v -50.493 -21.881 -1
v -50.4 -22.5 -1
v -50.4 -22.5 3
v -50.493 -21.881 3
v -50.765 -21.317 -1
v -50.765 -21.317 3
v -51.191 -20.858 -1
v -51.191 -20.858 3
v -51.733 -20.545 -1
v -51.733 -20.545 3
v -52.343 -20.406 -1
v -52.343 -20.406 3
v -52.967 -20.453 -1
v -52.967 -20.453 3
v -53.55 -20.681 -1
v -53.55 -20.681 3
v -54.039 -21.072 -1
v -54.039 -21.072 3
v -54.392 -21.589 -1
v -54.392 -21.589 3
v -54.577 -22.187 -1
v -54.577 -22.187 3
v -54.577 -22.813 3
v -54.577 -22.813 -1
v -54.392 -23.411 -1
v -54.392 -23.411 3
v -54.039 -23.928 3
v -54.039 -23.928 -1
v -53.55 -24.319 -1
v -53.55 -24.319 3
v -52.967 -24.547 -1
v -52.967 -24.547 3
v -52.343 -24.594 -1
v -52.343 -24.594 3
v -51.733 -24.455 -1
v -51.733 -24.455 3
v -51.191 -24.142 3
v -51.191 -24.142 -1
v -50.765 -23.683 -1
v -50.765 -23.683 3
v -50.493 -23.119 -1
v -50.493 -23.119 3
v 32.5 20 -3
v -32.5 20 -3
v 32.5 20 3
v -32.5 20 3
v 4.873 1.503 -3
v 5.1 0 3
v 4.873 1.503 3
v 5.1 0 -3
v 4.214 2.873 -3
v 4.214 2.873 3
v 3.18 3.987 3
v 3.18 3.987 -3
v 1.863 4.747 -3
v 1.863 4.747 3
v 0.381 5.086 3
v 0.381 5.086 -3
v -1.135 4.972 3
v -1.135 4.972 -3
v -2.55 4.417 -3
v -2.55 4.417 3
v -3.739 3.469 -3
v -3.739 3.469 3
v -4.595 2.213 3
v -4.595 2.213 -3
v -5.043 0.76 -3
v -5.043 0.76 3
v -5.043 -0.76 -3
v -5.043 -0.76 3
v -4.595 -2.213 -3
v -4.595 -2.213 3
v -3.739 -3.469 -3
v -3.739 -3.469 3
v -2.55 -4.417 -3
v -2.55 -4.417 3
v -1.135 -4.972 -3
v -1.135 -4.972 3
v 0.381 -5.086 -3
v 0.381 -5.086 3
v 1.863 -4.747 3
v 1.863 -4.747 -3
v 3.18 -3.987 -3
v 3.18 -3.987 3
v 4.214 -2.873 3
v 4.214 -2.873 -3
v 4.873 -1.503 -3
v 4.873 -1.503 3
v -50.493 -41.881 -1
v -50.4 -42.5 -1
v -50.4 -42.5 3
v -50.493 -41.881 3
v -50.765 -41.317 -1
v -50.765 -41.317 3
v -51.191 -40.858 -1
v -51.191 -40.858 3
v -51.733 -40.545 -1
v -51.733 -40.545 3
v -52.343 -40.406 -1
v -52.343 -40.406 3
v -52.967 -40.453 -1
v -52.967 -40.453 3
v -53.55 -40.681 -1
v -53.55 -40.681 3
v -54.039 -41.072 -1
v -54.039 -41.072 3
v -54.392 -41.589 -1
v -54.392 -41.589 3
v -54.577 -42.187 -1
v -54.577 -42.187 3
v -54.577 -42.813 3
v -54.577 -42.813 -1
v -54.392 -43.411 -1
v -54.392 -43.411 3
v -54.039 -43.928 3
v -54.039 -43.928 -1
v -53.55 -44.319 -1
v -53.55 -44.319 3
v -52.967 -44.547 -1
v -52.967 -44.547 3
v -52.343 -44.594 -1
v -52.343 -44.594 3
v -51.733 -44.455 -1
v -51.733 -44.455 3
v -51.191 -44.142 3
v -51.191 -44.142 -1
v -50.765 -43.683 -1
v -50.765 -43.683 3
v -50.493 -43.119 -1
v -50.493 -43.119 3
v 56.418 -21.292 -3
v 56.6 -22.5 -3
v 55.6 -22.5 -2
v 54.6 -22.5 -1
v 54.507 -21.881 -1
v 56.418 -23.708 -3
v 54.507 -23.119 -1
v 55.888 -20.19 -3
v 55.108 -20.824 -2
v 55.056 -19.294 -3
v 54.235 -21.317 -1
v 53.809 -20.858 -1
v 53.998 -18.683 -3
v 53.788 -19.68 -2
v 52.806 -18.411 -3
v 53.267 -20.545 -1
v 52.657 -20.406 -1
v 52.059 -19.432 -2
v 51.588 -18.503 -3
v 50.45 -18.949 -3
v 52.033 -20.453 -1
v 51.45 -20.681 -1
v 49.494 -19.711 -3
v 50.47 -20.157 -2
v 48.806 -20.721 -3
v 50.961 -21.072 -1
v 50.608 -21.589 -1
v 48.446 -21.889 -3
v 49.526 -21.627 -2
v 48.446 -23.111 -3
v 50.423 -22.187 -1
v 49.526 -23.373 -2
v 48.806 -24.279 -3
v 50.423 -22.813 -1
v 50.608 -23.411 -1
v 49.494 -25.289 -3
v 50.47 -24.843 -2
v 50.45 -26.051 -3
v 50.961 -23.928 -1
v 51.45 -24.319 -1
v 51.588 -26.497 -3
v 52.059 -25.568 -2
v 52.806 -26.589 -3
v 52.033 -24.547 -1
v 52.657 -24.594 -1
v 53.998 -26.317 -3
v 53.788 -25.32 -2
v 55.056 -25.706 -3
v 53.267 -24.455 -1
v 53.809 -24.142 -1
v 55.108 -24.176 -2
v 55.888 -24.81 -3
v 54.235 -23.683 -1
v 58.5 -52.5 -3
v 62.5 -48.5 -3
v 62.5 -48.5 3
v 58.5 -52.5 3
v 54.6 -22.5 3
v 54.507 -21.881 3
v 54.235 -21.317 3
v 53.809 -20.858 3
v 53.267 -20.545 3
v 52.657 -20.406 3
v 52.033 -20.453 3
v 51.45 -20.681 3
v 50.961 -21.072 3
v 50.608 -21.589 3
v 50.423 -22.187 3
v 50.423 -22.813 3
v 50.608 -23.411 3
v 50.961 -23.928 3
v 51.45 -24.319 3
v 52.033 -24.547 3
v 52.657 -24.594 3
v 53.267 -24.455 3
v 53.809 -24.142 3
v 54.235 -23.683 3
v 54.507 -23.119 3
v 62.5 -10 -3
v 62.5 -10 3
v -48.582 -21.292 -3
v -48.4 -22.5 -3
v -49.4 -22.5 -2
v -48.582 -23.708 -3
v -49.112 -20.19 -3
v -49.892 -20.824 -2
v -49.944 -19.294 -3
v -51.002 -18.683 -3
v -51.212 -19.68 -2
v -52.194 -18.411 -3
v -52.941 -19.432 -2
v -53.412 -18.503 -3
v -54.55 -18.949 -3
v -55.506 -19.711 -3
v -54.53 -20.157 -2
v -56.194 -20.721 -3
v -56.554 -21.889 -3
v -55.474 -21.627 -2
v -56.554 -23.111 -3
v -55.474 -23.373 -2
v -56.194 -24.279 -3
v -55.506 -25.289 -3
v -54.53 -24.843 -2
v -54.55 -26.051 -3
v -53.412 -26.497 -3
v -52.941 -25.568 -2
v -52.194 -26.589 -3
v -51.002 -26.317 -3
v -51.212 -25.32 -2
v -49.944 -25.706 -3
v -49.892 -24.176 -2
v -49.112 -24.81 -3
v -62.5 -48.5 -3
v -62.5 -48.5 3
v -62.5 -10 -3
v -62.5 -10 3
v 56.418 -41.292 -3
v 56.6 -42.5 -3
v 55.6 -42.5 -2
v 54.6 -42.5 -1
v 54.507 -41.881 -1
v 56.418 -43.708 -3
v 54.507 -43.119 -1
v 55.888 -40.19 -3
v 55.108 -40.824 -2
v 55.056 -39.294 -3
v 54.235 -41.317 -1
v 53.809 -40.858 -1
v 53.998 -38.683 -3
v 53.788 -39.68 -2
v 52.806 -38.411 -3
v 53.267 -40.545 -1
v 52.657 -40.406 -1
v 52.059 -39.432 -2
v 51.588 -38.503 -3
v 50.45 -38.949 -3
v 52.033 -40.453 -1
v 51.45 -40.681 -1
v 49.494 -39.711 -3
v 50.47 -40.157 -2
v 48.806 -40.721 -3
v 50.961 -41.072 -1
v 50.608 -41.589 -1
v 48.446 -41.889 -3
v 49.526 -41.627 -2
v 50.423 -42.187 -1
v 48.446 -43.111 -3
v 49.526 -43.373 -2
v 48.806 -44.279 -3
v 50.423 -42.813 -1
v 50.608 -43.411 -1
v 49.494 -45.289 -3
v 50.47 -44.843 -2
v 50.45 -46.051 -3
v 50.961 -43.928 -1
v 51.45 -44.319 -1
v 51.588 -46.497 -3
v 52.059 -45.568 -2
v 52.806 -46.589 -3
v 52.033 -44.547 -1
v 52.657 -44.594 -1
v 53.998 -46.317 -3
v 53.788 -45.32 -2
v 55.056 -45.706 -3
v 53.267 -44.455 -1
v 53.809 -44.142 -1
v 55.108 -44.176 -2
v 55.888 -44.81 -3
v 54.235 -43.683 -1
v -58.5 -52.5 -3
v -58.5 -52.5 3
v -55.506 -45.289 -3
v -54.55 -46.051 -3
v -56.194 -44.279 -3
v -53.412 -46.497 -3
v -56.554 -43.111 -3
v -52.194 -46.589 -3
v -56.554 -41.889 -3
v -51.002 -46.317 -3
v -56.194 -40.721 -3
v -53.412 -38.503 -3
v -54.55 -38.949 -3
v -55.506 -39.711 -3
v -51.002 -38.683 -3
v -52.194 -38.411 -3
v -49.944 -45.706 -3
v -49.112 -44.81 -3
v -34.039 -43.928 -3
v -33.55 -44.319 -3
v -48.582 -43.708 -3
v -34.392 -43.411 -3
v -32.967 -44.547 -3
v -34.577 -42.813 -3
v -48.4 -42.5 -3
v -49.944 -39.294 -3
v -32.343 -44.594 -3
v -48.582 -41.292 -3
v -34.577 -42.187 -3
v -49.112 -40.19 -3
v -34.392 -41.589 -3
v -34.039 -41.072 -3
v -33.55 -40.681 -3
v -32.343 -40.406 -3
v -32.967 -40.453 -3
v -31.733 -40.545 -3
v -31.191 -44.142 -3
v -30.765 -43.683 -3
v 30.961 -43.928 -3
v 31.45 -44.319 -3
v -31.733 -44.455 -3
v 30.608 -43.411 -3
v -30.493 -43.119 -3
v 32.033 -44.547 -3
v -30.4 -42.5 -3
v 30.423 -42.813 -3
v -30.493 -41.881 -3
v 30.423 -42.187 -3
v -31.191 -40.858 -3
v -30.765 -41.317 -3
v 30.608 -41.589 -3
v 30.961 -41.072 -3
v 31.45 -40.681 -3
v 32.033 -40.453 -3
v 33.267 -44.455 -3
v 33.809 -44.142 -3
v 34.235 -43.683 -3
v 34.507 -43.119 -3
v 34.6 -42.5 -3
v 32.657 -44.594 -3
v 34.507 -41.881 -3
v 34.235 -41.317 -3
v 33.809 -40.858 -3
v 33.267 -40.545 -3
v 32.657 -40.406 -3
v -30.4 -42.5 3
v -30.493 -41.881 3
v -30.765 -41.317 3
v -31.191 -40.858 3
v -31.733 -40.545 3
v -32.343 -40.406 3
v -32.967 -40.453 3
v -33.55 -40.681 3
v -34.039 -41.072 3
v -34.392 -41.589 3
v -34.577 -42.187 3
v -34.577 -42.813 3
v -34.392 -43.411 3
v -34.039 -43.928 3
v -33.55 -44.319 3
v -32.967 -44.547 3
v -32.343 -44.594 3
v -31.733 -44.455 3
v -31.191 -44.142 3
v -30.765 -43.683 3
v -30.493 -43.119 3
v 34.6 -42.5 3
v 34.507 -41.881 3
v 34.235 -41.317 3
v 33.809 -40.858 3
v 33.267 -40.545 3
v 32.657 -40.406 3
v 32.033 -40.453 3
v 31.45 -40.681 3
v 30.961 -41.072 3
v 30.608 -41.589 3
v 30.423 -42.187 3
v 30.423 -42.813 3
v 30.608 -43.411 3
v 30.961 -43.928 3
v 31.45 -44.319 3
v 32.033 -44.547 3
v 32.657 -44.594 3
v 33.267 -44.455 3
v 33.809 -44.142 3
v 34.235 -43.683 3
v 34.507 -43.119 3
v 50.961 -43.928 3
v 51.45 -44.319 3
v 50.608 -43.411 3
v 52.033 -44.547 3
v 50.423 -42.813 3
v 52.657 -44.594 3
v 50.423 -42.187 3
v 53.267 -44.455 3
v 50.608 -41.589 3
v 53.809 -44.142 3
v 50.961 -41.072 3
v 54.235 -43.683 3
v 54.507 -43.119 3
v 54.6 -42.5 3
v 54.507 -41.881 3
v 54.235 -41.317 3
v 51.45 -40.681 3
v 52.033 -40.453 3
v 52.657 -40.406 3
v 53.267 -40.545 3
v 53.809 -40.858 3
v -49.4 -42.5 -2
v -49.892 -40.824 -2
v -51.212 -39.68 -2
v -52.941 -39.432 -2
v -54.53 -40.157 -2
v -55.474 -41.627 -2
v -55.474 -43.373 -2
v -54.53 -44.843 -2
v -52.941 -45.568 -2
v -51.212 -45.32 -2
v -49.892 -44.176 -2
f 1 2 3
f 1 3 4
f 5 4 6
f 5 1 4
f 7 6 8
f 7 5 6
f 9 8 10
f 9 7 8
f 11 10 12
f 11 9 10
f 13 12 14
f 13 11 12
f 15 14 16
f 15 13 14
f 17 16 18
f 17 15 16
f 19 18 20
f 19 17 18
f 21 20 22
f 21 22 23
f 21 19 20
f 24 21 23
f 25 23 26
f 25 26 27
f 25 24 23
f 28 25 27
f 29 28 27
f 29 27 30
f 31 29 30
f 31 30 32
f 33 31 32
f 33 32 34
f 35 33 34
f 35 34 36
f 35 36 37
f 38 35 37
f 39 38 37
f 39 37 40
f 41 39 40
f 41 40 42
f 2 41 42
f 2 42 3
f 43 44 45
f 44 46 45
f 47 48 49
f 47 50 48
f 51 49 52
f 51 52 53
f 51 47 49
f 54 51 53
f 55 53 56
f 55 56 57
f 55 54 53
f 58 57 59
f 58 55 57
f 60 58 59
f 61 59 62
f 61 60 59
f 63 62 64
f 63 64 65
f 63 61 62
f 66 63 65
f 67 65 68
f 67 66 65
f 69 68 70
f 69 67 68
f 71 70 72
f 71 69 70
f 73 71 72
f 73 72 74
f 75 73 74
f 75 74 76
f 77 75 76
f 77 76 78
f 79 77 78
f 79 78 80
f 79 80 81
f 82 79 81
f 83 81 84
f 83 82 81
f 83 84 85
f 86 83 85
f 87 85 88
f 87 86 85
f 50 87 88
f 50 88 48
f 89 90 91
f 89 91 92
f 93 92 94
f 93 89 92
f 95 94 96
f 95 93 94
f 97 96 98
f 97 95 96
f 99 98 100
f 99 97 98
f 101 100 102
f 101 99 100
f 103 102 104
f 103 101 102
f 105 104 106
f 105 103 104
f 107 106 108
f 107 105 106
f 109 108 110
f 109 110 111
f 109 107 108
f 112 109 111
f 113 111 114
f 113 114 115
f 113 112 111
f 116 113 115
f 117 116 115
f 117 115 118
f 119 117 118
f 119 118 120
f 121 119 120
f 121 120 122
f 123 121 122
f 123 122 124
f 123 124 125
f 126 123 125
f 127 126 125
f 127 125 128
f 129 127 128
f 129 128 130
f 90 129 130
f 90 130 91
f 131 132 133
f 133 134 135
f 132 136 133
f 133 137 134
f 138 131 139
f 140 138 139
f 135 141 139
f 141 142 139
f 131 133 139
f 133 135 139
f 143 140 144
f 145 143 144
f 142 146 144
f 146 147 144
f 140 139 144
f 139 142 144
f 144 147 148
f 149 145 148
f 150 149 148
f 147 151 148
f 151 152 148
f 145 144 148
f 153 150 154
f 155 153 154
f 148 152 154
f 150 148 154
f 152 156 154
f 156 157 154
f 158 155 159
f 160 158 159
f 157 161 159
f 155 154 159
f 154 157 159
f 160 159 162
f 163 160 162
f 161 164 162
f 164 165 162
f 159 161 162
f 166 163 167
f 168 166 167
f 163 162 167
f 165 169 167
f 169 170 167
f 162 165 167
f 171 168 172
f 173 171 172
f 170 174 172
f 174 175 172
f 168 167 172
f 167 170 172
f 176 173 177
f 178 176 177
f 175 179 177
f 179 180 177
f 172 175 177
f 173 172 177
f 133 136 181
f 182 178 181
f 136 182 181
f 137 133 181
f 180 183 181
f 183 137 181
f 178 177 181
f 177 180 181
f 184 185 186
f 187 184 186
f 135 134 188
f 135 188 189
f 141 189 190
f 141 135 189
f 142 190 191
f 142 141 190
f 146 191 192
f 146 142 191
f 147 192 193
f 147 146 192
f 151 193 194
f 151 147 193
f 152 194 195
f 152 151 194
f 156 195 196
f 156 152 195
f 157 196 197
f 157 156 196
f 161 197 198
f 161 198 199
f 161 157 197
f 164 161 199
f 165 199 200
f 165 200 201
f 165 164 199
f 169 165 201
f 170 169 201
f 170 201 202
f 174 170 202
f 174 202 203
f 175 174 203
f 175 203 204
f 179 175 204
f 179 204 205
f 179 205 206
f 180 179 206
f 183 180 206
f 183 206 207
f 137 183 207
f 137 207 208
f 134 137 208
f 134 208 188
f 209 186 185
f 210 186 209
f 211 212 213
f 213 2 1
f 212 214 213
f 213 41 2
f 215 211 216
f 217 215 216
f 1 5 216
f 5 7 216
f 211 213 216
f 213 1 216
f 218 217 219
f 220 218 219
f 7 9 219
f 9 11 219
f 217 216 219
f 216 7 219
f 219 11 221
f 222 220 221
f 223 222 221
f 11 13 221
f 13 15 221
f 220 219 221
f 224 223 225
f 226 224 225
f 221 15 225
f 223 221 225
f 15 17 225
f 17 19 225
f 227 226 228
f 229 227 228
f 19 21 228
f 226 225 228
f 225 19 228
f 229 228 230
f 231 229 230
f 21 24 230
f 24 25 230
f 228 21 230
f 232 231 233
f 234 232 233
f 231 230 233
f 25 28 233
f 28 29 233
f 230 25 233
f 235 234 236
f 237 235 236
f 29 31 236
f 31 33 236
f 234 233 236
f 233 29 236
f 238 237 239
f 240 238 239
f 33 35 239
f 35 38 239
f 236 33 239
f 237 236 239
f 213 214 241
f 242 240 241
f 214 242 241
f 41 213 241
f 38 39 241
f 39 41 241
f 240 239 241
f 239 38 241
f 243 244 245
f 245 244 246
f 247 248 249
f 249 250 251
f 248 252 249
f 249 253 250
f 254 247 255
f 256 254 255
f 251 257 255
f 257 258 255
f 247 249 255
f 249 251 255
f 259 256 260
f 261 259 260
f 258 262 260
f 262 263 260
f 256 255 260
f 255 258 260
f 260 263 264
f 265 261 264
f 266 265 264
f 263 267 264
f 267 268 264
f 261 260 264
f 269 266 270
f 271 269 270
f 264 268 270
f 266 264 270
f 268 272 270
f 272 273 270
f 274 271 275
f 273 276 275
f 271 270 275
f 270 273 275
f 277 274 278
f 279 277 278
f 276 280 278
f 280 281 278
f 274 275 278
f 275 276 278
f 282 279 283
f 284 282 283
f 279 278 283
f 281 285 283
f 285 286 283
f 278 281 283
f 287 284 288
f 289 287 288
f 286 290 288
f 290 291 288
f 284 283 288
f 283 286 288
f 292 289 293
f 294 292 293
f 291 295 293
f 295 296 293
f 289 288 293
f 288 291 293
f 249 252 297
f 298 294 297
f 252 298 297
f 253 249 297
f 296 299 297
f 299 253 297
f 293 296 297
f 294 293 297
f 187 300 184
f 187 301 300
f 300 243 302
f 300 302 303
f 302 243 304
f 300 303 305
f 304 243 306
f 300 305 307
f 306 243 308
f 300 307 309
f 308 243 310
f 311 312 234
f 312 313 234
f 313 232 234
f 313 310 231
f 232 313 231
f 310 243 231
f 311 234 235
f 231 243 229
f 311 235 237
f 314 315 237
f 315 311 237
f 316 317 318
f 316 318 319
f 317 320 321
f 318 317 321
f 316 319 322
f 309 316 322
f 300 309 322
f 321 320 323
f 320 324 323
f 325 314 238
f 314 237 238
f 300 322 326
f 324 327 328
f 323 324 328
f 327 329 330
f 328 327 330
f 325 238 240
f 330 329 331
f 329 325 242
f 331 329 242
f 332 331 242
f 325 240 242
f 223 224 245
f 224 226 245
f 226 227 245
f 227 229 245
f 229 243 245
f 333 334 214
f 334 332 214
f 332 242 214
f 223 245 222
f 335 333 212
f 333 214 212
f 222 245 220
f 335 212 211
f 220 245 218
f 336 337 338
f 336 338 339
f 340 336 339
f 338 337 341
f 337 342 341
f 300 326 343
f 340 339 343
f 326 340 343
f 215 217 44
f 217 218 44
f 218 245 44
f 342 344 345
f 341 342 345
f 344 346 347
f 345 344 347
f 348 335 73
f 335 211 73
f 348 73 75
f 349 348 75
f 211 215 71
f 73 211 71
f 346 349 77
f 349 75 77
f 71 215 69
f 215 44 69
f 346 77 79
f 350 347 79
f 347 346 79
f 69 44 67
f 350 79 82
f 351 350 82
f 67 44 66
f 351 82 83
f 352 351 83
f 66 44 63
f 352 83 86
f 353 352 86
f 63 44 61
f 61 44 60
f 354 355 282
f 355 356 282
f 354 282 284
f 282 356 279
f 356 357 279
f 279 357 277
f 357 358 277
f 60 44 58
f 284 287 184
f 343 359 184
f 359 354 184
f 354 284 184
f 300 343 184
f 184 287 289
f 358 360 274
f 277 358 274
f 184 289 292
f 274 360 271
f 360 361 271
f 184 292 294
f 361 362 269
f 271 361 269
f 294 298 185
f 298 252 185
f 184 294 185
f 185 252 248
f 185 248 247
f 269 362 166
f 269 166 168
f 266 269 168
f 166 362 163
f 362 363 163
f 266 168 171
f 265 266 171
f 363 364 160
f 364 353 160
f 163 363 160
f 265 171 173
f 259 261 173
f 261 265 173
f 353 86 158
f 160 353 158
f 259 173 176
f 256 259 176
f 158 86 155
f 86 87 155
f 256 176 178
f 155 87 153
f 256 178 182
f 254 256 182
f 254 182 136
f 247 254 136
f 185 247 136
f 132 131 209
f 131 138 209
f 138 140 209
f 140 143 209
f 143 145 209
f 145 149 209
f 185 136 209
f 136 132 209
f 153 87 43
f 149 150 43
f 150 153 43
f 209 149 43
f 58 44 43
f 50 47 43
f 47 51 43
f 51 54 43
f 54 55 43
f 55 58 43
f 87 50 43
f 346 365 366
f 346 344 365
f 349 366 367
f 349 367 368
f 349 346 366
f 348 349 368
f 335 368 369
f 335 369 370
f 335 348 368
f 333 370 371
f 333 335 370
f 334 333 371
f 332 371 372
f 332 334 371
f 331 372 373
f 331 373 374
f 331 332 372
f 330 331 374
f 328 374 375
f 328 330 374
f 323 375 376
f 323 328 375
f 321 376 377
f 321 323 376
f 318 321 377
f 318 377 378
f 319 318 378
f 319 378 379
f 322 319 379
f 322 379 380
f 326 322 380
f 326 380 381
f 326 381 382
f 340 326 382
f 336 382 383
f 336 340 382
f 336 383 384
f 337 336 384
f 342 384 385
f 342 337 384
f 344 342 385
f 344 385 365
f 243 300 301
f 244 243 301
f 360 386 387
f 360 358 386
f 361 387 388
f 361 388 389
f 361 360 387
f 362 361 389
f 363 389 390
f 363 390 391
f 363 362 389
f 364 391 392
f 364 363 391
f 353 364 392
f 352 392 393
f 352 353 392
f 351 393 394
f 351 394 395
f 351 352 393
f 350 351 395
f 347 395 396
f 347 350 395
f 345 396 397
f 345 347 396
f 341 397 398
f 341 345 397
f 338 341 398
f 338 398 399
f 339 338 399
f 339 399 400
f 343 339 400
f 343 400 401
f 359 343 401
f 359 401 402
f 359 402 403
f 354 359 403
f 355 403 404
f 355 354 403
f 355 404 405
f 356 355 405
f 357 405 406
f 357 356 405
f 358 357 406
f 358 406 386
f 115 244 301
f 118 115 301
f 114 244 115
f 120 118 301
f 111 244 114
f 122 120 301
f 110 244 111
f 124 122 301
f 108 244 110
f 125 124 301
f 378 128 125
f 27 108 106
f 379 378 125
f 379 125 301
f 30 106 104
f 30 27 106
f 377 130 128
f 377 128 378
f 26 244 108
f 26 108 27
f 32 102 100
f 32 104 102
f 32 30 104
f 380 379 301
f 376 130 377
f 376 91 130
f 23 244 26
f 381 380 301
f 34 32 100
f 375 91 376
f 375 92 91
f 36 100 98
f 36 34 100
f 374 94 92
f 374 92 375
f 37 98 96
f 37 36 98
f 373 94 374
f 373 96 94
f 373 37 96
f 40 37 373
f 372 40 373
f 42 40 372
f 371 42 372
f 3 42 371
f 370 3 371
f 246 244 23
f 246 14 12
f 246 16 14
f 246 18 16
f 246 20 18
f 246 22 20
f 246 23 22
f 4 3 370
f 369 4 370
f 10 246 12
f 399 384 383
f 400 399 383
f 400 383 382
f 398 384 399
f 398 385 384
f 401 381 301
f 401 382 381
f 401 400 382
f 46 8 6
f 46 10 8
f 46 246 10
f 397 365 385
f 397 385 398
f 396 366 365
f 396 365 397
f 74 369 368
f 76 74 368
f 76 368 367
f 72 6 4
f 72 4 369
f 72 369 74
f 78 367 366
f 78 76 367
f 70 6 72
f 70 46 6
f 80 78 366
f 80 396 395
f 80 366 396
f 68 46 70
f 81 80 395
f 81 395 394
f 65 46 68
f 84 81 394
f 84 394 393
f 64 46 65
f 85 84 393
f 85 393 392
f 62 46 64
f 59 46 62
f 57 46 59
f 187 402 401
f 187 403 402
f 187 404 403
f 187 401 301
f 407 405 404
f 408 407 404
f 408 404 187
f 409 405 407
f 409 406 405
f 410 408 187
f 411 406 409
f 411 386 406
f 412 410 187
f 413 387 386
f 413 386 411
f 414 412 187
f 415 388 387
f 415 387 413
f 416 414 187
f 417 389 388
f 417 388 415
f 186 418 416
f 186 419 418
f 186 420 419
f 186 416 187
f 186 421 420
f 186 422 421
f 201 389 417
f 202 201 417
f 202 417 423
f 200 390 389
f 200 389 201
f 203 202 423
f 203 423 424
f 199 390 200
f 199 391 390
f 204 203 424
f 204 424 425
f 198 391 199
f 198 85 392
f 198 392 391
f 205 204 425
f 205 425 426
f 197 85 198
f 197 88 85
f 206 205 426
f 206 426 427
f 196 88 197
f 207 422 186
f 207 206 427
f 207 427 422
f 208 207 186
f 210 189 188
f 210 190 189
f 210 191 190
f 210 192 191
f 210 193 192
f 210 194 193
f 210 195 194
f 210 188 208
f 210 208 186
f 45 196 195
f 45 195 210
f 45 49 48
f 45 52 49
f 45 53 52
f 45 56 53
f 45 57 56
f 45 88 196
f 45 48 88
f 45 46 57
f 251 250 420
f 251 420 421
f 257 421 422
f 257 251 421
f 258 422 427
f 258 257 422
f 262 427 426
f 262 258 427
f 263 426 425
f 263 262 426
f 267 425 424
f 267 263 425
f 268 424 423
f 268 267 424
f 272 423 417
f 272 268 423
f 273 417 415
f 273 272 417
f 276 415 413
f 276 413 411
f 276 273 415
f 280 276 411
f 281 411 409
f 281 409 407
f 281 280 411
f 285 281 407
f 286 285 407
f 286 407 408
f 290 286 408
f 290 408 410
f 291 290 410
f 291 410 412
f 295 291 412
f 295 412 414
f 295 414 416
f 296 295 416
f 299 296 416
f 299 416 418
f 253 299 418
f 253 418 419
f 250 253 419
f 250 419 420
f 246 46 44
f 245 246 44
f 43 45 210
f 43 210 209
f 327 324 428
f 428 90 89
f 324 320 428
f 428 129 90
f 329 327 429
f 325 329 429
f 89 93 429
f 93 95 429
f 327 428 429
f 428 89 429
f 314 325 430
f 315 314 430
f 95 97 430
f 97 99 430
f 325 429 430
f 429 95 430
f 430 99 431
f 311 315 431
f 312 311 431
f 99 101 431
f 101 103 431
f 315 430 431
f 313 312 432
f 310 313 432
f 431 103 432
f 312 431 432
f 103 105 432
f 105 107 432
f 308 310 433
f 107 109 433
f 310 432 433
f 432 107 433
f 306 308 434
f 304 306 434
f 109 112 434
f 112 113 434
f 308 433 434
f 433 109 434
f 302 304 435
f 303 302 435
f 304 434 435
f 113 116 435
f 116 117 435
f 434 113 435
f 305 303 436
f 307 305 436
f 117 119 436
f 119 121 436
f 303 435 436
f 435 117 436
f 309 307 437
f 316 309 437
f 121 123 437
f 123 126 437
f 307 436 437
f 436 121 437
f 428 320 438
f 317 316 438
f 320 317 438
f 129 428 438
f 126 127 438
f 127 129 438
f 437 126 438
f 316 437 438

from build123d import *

# Parameters (mm, degrees)
SKETCH_1_W      = 125
SKETCH_1_H      = 72.5
SKETCH_1_R      = 5.1
SKETCH_1_R_2    = 2.1
EXTRUDE_1_DEPTH = 3
CHAMFER_1_SIZE  = 30
CHAMFER_2_SIZE  = 4
CHAMFER_3_SIZE  = 2


with BuildPart() as part:
    # 草图1 → 凸台-拉伸1 (new, symmetric)
    with BuildSketch(Plane.XY):
        with Locations((0, -16.25)):
            Rectangle(SKETCH_1_W, SKETCH_1_H)
        Circle(SKETCH_1_R, mode=Mode.SUBTRACT)
        with Locations((-32.5, -42.5)):
            Circle(SKETCH_1_R_2, mode=Mode.SUBTRACT)
        with Locations((32.5, -42.5)):
            Circle(SKETCH_1_R_2, mode=Mode.SUBTRACT)
        with Locations((-52.5, -42.5)):
            Circle(SKETCH_1_R_2, mode=Mode.SUBTRACT)
        with Locations((52.5, -42.5)):
            Circle(SKETCH_1_R_2, mode=Mode.SUBTRACT)
        with Locations((-52.5, -22.5)):
            Circle(SKETCH_1_R_2, mode=Mode.SUBTRACT)
        with Locations((52.5, -22.5)):
            Circle(SKETCH_1_R_2, mode=Mode.SUBTRACT)
    extrude(amount=EXTRUDE_1_DEPTH, both=True)

    # 倒角1
    chamfer_1_edges = [part.edges().sort_by_distance(p)[0] for p in [
        (62.5, 20, 0),
        (-62.5, 20, 0),
    ]]
    chamfer(chamfer_1_edges, length=CHAMFER_1_SIZE)

    # 倒角2
    chamfer_2_edges = [part.edges().sort_by_distance(p)[0] for p in [
        (62.5, -52.5, 0),
        (-62.5, -52.5, 0),
    ]]
    chamfer(chamfer_2_edges, length=CHAMFER_2_SIZE)

    # 倒角3
    chamfer_3_edges = [part.edges().sort_by_distance(p)[0] for p in [
        (-54.6, -42.5, -3),
        (50.4, -42.5, -3),
        (-54.6, -22.5, -3),
        (50.4, -22.5, -3),
    ]]
    chamfer(chamfer_3_edges, length=CHAMFER_3_SIZE)


solid = part.part
